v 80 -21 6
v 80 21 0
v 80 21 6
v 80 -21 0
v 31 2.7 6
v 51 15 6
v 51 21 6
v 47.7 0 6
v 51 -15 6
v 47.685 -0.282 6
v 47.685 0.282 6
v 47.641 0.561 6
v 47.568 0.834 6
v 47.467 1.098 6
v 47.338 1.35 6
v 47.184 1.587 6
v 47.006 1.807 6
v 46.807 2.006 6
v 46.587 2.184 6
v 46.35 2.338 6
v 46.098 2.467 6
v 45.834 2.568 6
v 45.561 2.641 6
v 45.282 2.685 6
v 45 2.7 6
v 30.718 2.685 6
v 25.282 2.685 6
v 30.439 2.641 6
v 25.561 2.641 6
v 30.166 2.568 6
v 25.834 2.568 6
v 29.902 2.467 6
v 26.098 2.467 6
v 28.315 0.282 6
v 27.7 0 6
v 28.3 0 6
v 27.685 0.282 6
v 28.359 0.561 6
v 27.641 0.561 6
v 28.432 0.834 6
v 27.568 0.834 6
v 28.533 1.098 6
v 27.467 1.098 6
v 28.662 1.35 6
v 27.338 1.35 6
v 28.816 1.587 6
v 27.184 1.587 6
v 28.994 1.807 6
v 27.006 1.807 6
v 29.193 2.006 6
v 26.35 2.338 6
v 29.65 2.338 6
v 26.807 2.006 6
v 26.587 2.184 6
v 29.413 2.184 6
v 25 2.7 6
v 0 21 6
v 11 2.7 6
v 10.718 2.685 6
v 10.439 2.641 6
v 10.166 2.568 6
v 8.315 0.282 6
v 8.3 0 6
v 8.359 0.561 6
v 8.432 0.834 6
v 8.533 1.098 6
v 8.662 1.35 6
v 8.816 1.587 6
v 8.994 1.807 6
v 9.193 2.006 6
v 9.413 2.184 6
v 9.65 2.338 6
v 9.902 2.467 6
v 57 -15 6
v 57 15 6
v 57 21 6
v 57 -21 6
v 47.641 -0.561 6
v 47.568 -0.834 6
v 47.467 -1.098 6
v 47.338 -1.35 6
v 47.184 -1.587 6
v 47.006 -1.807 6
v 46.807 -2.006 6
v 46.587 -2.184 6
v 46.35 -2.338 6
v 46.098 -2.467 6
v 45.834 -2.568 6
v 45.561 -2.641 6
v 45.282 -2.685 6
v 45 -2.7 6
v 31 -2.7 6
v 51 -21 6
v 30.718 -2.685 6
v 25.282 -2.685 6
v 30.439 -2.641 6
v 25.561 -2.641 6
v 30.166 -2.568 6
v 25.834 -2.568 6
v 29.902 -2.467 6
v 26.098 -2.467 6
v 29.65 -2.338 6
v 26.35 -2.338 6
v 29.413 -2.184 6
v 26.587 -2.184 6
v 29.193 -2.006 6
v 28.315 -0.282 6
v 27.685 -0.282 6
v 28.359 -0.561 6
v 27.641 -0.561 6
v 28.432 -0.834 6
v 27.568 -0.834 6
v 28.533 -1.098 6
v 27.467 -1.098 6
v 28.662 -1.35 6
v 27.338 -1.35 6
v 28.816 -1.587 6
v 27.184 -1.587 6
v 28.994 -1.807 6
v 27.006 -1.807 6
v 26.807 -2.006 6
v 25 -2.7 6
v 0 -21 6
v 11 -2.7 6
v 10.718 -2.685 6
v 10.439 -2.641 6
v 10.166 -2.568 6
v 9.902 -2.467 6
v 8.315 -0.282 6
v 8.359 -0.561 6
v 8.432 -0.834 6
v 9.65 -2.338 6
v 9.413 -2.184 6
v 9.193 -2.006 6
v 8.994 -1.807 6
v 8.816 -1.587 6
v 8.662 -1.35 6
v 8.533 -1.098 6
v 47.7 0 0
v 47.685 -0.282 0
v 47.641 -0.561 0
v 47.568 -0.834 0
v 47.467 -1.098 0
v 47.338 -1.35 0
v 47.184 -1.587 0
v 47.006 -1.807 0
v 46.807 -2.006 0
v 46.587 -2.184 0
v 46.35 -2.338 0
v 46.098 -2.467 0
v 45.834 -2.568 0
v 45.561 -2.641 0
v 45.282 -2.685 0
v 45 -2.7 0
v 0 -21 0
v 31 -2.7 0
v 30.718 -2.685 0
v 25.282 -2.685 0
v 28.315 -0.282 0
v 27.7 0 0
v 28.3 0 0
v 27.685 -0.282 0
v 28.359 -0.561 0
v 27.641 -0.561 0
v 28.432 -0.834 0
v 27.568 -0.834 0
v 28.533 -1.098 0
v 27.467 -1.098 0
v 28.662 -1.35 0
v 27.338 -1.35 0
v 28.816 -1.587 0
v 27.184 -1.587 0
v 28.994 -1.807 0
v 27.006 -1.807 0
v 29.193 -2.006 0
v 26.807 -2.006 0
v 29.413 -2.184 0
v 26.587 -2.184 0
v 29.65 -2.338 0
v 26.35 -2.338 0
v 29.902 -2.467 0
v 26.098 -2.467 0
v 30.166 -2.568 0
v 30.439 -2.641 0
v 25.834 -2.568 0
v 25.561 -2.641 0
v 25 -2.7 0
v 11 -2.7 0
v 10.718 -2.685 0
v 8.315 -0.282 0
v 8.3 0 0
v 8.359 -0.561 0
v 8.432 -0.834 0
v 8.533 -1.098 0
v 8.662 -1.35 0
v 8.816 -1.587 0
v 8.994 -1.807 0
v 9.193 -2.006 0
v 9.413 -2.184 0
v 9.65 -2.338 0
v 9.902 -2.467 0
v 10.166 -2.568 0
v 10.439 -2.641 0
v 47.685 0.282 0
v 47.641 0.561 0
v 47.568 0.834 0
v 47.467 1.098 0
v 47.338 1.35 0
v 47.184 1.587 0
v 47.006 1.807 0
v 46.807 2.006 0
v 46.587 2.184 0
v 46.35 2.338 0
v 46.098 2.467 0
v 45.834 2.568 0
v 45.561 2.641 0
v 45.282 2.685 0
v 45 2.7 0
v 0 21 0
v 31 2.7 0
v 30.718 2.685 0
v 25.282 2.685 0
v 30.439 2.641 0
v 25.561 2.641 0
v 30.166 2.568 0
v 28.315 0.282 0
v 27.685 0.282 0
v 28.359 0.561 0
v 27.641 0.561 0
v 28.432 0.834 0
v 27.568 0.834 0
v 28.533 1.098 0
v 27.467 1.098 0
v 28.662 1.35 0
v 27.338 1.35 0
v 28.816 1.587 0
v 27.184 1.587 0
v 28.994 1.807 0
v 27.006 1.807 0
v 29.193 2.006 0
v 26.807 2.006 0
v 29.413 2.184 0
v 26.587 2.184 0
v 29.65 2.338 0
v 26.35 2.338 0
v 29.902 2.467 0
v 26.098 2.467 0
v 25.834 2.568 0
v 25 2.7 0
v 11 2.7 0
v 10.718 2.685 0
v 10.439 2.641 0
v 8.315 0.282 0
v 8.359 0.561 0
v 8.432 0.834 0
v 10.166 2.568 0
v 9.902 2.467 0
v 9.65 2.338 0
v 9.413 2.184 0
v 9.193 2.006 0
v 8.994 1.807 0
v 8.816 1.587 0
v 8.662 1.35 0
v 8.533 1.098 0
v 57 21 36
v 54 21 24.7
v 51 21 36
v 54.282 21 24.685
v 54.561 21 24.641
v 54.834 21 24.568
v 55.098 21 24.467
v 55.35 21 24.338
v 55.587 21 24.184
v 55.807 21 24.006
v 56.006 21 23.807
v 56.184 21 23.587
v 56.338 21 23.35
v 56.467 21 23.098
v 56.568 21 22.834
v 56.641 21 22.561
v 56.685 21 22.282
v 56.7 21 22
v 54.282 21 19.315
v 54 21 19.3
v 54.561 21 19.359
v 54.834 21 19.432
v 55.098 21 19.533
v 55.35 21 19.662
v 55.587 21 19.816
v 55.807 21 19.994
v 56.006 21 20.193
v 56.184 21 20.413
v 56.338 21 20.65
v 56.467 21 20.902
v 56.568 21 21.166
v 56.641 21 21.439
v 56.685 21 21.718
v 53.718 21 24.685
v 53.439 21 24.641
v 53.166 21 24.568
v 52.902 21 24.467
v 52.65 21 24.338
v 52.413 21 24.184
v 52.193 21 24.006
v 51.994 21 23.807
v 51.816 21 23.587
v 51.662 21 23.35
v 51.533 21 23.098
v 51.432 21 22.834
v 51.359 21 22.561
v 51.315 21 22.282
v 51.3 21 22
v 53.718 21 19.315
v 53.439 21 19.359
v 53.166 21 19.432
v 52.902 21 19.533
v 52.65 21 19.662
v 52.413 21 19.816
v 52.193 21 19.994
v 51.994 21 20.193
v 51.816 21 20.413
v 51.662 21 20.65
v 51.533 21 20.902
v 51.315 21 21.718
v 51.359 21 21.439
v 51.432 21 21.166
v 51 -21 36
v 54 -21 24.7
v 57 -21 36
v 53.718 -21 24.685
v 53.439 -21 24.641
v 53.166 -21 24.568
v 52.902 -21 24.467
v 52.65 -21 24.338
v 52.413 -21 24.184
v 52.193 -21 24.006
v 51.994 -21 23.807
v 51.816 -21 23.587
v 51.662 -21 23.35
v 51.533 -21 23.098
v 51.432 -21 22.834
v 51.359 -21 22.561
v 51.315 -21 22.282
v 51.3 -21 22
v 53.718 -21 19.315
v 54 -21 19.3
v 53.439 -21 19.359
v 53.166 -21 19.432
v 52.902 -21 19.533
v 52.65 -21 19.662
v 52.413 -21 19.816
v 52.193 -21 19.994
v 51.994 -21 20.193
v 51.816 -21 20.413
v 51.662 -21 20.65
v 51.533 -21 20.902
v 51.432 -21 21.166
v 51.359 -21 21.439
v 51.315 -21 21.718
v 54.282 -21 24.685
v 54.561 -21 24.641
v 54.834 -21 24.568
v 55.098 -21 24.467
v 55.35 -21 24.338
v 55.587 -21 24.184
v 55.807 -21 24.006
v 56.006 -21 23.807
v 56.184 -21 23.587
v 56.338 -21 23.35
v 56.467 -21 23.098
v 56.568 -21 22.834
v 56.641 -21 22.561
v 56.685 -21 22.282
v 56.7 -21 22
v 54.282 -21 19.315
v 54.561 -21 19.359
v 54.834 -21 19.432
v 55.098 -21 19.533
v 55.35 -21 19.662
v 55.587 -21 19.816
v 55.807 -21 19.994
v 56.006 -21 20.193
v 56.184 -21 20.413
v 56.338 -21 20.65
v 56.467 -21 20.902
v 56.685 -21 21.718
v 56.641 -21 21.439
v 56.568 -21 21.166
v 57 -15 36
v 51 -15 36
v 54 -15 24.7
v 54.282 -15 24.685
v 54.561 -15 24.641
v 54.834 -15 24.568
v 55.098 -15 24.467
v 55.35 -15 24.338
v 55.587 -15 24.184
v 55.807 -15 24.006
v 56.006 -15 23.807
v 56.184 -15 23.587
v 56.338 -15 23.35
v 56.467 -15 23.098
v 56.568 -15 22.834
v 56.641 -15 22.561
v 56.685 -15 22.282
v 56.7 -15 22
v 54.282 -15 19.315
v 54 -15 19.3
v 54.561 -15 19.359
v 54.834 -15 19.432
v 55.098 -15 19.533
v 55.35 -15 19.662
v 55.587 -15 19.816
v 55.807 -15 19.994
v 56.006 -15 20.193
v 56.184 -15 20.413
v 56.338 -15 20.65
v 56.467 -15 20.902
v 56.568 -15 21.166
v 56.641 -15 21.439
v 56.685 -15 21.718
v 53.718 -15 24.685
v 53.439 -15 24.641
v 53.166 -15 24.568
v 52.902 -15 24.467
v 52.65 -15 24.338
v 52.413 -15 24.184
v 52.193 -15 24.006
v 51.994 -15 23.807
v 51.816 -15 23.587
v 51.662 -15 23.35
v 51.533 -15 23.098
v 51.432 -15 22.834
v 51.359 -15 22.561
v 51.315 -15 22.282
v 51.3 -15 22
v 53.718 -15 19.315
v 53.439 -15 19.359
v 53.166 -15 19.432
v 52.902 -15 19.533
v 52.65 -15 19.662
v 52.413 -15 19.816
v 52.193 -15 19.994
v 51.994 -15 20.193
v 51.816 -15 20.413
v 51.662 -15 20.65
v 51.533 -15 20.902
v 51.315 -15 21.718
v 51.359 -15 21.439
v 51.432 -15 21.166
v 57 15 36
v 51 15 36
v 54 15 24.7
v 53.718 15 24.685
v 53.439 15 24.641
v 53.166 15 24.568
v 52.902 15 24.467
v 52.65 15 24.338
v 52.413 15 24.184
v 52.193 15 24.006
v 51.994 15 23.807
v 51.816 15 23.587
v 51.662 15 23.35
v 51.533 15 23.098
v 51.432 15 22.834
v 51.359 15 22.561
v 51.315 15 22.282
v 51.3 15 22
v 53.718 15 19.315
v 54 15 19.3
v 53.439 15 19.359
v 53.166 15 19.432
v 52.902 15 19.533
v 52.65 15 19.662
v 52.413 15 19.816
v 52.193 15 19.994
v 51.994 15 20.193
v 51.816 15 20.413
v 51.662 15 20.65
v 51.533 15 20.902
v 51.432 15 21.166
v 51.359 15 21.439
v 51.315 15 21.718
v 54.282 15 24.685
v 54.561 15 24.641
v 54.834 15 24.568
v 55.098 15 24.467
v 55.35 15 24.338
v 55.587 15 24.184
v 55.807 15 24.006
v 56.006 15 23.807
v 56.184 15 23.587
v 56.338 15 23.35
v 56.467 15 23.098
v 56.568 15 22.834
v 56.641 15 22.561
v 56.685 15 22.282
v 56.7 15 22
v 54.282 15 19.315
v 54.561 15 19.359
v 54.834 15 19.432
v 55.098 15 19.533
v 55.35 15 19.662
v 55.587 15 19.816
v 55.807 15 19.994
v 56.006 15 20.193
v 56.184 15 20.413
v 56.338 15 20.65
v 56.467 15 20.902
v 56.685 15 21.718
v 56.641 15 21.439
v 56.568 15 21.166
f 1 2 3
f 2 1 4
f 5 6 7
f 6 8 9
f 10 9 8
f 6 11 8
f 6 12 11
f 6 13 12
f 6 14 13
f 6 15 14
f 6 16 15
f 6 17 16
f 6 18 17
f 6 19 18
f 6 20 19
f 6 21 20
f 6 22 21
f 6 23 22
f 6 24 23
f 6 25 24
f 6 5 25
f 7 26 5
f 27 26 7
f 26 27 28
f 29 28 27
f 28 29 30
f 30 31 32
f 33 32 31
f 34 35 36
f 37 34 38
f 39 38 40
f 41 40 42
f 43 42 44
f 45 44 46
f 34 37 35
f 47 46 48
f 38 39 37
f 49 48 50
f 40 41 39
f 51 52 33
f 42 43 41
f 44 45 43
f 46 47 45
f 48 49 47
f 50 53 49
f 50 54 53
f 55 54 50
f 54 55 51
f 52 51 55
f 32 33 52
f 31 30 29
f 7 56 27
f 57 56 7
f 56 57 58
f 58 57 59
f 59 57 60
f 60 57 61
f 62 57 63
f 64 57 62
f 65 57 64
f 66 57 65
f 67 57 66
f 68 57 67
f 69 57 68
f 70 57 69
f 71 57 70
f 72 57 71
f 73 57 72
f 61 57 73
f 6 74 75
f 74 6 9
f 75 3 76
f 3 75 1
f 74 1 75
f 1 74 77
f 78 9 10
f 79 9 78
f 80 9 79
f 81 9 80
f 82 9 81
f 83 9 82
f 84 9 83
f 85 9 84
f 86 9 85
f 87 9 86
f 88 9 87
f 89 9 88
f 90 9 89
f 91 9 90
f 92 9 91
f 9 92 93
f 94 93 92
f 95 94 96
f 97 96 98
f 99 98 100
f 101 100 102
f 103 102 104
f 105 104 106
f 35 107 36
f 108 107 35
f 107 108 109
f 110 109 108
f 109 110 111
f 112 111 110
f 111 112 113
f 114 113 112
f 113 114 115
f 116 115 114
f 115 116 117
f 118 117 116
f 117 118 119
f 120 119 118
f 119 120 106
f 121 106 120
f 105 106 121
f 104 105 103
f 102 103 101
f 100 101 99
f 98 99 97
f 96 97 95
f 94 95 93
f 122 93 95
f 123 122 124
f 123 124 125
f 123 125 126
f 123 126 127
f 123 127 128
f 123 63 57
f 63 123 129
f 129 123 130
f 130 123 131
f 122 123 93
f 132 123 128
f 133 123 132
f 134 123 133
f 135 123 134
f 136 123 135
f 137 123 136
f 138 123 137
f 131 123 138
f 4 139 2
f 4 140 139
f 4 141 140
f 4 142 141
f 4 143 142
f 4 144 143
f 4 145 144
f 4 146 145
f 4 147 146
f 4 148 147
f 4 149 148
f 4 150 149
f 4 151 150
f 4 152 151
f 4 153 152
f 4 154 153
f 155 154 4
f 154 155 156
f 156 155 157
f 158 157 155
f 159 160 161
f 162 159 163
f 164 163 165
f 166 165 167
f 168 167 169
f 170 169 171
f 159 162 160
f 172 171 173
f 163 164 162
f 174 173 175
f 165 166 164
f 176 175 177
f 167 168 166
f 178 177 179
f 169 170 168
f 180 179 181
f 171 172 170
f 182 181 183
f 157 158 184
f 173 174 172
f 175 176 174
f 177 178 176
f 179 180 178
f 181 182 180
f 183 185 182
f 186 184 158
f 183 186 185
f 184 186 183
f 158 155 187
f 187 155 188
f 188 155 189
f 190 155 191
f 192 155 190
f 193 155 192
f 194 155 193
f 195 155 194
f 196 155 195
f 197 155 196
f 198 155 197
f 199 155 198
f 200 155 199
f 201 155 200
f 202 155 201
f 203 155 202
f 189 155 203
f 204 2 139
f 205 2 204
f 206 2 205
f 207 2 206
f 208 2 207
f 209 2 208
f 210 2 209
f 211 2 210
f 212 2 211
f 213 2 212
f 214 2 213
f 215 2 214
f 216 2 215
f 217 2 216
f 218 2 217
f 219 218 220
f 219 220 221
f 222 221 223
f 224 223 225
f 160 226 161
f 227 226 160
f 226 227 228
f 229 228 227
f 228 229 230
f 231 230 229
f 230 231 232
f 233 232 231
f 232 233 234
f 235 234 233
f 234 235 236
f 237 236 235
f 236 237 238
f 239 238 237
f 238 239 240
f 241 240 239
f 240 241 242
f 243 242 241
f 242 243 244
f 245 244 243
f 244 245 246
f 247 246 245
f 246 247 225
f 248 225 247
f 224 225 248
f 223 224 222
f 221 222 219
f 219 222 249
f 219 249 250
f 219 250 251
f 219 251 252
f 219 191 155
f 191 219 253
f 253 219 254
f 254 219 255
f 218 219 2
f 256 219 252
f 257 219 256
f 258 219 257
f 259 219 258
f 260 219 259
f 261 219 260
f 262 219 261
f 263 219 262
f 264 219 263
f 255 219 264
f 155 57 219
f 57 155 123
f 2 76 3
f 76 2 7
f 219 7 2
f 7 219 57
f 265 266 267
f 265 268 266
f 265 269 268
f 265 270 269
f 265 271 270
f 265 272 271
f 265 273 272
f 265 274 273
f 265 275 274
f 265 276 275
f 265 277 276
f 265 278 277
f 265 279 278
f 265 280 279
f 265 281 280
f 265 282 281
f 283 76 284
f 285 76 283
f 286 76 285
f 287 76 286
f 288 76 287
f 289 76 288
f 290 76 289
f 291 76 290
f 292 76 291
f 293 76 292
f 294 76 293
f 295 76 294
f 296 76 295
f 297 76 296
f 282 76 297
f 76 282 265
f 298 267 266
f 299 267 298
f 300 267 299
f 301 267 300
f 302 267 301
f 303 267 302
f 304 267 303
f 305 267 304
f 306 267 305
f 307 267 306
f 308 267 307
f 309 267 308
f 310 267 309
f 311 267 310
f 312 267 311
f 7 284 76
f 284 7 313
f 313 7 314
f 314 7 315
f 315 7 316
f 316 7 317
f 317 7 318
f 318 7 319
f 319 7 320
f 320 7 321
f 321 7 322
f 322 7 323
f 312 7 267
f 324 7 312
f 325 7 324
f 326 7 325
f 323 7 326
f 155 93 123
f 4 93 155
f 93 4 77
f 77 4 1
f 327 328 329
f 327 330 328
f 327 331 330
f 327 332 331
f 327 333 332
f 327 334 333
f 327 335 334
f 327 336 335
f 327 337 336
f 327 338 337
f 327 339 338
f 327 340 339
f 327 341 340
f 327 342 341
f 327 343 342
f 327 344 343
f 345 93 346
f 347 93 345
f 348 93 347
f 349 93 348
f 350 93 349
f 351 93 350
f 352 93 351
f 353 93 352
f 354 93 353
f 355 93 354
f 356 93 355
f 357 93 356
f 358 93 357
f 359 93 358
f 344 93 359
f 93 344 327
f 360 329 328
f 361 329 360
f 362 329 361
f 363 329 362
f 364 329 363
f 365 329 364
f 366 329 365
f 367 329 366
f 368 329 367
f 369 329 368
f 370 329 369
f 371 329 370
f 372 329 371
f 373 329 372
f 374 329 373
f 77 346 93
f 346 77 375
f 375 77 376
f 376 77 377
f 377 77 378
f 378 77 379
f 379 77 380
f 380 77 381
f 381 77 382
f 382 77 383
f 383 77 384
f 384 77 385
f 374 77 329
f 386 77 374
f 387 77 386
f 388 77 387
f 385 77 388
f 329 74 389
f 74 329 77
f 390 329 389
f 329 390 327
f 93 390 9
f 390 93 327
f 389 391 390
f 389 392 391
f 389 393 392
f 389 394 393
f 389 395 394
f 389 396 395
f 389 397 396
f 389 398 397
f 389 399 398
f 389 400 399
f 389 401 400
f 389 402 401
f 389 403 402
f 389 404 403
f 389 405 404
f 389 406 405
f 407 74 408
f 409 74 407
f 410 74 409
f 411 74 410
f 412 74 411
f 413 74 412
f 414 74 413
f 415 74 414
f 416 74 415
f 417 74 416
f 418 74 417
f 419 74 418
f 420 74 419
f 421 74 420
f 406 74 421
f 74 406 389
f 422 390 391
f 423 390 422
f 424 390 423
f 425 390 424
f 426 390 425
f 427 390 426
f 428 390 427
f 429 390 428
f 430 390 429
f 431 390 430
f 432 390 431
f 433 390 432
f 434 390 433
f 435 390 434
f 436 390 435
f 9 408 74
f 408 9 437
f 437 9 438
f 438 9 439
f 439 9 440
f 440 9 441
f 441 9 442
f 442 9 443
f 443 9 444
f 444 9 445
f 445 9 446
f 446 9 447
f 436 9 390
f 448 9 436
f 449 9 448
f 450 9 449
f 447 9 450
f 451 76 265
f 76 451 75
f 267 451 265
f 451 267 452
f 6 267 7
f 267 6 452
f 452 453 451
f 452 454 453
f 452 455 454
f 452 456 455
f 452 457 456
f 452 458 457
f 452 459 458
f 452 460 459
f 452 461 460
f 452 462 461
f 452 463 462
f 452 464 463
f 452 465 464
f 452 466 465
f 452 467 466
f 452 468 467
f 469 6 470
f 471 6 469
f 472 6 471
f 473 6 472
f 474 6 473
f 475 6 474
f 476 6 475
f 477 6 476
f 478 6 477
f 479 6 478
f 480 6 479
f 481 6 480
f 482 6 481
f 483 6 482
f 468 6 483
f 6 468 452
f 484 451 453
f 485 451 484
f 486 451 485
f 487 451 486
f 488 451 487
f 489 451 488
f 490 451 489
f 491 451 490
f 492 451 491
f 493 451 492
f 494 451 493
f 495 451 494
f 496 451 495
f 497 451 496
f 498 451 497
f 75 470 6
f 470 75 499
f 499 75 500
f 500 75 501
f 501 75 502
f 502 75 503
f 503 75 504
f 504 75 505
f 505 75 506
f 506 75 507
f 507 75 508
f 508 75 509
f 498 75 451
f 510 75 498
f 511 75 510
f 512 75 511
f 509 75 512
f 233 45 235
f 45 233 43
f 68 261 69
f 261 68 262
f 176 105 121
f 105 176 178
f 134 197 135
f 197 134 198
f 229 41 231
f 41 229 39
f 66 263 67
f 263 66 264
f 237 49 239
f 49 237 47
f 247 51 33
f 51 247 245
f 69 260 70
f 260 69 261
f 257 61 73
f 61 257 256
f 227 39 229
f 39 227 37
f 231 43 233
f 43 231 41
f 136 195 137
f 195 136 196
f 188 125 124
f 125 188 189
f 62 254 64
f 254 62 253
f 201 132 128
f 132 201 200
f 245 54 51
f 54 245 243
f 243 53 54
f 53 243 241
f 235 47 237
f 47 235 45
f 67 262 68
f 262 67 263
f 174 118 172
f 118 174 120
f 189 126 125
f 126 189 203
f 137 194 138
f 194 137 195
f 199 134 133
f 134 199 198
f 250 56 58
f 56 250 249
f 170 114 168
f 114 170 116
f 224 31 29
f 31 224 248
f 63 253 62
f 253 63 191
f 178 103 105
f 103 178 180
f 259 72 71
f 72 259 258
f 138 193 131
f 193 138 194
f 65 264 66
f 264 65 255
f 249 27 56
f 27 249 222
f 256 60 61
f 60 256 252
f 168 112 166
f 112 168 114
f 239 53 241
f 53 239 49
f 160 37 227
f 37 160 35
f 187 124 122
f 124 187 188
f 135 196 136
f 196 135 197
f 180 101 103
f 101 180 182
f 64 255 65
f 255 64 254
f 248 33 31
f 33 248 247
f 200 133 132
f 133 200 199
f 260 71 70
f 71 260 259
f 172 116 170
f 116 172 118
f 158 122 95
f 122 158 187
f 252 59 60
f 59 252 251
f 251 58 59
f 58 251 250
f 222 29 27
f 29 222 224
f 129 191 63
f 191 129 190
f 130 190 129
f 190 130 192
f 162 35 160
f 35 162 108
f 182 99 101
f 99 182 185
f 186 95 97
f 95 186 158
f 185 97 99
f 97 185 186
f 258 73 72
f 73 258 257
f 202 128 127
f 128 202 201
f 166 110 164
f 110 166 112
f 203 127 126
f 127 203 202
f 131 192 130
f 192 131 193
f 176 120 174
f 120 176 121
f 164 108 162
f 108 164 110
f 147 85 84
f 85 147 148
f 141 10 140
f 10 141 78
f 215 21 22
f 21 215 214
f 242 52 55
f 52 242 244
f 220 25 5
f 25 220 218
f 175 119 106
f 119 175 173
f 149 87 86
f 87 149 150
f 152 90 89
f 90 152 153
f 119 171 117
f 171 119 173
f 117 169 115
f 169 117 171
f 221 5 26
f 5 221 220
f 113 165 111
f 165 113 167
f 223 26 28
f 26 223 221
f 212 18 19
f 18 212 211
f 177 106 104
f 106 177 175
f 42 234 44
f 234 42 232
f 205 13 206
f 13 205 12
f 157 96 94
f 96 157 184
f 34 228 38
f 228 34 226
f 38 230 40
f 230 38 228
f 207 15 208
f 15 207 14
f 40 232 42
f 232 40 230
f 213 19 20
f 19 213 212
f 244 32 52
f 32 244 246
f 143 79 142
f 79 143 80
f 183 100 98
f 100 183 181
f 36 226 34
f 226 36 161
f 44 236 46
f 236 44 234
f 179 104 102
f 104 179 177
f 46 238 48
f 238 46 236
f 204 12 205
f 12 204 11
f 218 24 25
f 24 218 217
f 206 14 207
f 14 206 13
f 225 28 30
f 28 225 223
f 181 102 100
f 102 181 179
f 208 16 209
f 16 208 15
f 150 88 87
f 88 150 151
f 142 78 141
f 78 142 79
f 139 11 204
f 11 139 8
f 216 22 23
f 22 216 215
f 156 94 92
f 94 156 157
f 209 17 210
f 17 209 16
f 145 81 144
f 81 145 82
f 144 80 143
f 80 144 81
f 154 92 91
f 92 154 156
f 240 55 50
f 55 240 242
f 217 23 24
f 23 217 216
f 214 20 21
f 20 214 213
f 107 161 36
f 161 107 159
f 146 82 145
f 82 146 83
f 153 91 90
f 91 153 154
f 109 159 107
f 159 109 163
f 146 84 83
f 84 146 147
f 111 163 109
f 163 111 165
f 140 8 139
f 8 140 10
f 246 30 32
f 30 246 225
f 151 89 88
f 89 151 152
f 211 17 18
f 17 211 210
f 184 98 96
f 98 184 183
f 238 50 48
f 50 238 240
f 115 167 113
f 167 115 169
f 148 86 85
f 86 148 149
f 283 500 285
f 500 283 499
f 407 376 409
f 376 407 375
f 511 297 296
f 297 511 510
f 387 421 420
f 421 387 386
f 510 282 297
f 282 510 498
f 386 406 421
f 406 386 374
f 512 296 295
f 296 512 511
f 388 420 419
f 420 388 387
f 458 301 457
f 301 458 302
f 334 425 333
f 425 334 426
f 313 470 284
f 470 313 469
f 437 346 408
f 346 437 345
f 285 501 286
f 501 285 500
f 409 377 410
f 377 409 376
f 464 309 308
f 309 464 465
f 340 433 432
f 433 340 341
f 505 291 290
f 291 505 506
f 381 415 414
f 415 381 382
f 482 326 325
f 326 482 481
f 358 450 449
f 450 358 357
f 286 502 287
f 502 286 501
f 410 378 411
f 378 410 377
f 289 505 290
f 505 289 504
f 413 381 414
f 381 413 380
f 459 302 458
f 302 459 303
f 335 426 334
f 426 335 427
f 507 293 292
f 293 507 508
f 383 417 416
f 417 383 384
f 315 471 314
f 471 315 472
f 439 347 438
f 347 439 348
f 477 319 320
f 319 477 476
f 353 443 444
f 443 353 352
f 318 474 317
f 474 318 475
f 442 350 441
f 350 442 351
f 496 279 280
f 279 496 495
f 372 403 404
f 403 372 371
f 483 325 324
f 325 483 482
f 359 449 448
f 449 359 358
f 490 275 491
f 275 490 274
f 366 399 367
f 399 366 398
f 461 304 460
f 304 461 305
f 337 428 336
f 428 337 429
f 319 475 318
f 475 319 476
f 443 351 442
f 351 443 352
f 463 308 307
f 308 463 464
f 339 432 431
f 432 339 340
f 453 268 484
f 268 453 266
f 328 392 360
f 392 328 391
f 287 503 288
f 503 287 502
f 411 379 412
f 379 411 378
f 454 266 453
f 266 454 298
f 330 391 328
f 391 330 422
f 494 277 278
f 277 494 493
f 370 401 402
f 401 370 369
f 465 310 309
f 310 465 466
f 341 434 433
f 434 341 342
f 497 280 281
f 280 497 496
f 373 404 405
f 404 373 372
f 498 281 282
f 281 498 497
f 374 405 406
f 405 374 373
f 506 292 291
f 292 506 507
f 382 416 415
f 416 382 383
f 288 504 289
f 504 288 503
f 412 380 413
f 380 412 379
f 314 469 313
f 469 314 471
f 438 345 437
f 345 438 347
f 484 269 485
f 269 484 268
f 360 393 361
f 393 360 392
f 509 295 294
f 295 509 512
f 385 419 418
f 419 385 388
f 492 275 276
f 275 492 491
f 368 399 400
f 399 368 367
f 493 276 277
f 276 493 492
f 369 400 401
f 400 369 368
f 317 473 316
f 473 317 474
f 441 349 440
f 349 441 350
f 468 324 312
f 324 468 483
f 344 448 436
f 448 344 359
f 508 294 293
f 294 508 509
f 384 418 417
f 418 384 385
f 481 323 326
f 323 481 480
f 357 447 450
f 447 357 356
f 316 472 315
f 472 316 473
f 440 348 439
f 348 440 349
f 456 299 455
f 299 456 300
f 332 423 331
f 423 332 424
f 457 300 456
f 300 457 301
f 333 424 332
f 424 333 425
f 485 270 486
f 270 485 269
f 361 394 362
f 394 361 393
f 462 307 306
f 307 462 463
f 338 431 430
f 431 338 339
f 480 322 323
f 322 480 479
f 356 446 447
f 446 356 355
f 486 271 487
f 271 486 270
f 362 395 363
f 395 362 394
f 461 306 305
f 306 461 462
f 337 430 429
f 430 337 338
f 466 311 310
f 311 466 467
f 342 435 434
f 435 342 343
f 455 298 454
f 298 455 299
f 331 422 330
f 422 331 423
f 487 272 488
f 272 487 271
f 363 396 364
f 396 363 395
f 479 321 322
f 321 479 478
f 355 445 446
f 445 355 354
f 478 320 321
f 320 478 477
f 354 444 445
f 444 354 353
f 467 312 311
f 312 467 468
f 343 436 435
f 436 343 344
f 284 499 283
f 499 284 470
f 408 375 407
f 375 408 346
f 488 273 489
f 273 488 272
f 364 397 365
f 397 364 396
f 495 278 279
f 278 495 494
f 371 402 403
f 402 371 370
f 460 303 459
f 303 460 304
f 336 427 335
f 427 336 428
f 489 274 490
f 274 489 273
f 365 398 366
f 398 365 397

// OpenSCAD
// M5 idler pulley tensioner bracket
// Double-ear idler bracket for an M5 axle; ears and base overlap by 2 mm.
$fn = 60;
eps = 0.02;
base_l = 80;
base_w = 42;
base_t = 6;
ear_t = 6;
ear_h = 32;
axle_d = 5.4;
mount_slot_l = 14;
mount_slot_d = 5.4;
axle_x = 54;
axle_z = 22;

module mounting_slot(x) {
    hull() {
        translate([x - mount_slot_l / 2, 0, -eps]) cylinder(d = mount_slot_d, h = base_t + 2 * eps);
        translate([x + mount_slot_l / 2, 0, -eps]) cylinder(d = mount_slot_d, h = base_t + 2 * eps);
    }
}

difference() {
    union() {
        translate([0, -base_w / 2, 0]) cube([base_l, base_w, base_t]);
        translate([axle_x - ear_t / 2, -base_w / 2, base_t - 2]) cube([ear_t, ear_t, ear_h]);
        translate([axle_x - ear_t / 2, base_w / 2 - ear_t, base_t - 2]) cube([ear_t, ear_t, ear_h]);
    }
    mounting_slot(18);
    mounting_slot(38);
    translate([axle_x, -base_w / 2 - eps, axle_z])
        rotate([-90, 0, 0]) cylinder(d = axle_d, h = base_w + 2 * eps);
}
